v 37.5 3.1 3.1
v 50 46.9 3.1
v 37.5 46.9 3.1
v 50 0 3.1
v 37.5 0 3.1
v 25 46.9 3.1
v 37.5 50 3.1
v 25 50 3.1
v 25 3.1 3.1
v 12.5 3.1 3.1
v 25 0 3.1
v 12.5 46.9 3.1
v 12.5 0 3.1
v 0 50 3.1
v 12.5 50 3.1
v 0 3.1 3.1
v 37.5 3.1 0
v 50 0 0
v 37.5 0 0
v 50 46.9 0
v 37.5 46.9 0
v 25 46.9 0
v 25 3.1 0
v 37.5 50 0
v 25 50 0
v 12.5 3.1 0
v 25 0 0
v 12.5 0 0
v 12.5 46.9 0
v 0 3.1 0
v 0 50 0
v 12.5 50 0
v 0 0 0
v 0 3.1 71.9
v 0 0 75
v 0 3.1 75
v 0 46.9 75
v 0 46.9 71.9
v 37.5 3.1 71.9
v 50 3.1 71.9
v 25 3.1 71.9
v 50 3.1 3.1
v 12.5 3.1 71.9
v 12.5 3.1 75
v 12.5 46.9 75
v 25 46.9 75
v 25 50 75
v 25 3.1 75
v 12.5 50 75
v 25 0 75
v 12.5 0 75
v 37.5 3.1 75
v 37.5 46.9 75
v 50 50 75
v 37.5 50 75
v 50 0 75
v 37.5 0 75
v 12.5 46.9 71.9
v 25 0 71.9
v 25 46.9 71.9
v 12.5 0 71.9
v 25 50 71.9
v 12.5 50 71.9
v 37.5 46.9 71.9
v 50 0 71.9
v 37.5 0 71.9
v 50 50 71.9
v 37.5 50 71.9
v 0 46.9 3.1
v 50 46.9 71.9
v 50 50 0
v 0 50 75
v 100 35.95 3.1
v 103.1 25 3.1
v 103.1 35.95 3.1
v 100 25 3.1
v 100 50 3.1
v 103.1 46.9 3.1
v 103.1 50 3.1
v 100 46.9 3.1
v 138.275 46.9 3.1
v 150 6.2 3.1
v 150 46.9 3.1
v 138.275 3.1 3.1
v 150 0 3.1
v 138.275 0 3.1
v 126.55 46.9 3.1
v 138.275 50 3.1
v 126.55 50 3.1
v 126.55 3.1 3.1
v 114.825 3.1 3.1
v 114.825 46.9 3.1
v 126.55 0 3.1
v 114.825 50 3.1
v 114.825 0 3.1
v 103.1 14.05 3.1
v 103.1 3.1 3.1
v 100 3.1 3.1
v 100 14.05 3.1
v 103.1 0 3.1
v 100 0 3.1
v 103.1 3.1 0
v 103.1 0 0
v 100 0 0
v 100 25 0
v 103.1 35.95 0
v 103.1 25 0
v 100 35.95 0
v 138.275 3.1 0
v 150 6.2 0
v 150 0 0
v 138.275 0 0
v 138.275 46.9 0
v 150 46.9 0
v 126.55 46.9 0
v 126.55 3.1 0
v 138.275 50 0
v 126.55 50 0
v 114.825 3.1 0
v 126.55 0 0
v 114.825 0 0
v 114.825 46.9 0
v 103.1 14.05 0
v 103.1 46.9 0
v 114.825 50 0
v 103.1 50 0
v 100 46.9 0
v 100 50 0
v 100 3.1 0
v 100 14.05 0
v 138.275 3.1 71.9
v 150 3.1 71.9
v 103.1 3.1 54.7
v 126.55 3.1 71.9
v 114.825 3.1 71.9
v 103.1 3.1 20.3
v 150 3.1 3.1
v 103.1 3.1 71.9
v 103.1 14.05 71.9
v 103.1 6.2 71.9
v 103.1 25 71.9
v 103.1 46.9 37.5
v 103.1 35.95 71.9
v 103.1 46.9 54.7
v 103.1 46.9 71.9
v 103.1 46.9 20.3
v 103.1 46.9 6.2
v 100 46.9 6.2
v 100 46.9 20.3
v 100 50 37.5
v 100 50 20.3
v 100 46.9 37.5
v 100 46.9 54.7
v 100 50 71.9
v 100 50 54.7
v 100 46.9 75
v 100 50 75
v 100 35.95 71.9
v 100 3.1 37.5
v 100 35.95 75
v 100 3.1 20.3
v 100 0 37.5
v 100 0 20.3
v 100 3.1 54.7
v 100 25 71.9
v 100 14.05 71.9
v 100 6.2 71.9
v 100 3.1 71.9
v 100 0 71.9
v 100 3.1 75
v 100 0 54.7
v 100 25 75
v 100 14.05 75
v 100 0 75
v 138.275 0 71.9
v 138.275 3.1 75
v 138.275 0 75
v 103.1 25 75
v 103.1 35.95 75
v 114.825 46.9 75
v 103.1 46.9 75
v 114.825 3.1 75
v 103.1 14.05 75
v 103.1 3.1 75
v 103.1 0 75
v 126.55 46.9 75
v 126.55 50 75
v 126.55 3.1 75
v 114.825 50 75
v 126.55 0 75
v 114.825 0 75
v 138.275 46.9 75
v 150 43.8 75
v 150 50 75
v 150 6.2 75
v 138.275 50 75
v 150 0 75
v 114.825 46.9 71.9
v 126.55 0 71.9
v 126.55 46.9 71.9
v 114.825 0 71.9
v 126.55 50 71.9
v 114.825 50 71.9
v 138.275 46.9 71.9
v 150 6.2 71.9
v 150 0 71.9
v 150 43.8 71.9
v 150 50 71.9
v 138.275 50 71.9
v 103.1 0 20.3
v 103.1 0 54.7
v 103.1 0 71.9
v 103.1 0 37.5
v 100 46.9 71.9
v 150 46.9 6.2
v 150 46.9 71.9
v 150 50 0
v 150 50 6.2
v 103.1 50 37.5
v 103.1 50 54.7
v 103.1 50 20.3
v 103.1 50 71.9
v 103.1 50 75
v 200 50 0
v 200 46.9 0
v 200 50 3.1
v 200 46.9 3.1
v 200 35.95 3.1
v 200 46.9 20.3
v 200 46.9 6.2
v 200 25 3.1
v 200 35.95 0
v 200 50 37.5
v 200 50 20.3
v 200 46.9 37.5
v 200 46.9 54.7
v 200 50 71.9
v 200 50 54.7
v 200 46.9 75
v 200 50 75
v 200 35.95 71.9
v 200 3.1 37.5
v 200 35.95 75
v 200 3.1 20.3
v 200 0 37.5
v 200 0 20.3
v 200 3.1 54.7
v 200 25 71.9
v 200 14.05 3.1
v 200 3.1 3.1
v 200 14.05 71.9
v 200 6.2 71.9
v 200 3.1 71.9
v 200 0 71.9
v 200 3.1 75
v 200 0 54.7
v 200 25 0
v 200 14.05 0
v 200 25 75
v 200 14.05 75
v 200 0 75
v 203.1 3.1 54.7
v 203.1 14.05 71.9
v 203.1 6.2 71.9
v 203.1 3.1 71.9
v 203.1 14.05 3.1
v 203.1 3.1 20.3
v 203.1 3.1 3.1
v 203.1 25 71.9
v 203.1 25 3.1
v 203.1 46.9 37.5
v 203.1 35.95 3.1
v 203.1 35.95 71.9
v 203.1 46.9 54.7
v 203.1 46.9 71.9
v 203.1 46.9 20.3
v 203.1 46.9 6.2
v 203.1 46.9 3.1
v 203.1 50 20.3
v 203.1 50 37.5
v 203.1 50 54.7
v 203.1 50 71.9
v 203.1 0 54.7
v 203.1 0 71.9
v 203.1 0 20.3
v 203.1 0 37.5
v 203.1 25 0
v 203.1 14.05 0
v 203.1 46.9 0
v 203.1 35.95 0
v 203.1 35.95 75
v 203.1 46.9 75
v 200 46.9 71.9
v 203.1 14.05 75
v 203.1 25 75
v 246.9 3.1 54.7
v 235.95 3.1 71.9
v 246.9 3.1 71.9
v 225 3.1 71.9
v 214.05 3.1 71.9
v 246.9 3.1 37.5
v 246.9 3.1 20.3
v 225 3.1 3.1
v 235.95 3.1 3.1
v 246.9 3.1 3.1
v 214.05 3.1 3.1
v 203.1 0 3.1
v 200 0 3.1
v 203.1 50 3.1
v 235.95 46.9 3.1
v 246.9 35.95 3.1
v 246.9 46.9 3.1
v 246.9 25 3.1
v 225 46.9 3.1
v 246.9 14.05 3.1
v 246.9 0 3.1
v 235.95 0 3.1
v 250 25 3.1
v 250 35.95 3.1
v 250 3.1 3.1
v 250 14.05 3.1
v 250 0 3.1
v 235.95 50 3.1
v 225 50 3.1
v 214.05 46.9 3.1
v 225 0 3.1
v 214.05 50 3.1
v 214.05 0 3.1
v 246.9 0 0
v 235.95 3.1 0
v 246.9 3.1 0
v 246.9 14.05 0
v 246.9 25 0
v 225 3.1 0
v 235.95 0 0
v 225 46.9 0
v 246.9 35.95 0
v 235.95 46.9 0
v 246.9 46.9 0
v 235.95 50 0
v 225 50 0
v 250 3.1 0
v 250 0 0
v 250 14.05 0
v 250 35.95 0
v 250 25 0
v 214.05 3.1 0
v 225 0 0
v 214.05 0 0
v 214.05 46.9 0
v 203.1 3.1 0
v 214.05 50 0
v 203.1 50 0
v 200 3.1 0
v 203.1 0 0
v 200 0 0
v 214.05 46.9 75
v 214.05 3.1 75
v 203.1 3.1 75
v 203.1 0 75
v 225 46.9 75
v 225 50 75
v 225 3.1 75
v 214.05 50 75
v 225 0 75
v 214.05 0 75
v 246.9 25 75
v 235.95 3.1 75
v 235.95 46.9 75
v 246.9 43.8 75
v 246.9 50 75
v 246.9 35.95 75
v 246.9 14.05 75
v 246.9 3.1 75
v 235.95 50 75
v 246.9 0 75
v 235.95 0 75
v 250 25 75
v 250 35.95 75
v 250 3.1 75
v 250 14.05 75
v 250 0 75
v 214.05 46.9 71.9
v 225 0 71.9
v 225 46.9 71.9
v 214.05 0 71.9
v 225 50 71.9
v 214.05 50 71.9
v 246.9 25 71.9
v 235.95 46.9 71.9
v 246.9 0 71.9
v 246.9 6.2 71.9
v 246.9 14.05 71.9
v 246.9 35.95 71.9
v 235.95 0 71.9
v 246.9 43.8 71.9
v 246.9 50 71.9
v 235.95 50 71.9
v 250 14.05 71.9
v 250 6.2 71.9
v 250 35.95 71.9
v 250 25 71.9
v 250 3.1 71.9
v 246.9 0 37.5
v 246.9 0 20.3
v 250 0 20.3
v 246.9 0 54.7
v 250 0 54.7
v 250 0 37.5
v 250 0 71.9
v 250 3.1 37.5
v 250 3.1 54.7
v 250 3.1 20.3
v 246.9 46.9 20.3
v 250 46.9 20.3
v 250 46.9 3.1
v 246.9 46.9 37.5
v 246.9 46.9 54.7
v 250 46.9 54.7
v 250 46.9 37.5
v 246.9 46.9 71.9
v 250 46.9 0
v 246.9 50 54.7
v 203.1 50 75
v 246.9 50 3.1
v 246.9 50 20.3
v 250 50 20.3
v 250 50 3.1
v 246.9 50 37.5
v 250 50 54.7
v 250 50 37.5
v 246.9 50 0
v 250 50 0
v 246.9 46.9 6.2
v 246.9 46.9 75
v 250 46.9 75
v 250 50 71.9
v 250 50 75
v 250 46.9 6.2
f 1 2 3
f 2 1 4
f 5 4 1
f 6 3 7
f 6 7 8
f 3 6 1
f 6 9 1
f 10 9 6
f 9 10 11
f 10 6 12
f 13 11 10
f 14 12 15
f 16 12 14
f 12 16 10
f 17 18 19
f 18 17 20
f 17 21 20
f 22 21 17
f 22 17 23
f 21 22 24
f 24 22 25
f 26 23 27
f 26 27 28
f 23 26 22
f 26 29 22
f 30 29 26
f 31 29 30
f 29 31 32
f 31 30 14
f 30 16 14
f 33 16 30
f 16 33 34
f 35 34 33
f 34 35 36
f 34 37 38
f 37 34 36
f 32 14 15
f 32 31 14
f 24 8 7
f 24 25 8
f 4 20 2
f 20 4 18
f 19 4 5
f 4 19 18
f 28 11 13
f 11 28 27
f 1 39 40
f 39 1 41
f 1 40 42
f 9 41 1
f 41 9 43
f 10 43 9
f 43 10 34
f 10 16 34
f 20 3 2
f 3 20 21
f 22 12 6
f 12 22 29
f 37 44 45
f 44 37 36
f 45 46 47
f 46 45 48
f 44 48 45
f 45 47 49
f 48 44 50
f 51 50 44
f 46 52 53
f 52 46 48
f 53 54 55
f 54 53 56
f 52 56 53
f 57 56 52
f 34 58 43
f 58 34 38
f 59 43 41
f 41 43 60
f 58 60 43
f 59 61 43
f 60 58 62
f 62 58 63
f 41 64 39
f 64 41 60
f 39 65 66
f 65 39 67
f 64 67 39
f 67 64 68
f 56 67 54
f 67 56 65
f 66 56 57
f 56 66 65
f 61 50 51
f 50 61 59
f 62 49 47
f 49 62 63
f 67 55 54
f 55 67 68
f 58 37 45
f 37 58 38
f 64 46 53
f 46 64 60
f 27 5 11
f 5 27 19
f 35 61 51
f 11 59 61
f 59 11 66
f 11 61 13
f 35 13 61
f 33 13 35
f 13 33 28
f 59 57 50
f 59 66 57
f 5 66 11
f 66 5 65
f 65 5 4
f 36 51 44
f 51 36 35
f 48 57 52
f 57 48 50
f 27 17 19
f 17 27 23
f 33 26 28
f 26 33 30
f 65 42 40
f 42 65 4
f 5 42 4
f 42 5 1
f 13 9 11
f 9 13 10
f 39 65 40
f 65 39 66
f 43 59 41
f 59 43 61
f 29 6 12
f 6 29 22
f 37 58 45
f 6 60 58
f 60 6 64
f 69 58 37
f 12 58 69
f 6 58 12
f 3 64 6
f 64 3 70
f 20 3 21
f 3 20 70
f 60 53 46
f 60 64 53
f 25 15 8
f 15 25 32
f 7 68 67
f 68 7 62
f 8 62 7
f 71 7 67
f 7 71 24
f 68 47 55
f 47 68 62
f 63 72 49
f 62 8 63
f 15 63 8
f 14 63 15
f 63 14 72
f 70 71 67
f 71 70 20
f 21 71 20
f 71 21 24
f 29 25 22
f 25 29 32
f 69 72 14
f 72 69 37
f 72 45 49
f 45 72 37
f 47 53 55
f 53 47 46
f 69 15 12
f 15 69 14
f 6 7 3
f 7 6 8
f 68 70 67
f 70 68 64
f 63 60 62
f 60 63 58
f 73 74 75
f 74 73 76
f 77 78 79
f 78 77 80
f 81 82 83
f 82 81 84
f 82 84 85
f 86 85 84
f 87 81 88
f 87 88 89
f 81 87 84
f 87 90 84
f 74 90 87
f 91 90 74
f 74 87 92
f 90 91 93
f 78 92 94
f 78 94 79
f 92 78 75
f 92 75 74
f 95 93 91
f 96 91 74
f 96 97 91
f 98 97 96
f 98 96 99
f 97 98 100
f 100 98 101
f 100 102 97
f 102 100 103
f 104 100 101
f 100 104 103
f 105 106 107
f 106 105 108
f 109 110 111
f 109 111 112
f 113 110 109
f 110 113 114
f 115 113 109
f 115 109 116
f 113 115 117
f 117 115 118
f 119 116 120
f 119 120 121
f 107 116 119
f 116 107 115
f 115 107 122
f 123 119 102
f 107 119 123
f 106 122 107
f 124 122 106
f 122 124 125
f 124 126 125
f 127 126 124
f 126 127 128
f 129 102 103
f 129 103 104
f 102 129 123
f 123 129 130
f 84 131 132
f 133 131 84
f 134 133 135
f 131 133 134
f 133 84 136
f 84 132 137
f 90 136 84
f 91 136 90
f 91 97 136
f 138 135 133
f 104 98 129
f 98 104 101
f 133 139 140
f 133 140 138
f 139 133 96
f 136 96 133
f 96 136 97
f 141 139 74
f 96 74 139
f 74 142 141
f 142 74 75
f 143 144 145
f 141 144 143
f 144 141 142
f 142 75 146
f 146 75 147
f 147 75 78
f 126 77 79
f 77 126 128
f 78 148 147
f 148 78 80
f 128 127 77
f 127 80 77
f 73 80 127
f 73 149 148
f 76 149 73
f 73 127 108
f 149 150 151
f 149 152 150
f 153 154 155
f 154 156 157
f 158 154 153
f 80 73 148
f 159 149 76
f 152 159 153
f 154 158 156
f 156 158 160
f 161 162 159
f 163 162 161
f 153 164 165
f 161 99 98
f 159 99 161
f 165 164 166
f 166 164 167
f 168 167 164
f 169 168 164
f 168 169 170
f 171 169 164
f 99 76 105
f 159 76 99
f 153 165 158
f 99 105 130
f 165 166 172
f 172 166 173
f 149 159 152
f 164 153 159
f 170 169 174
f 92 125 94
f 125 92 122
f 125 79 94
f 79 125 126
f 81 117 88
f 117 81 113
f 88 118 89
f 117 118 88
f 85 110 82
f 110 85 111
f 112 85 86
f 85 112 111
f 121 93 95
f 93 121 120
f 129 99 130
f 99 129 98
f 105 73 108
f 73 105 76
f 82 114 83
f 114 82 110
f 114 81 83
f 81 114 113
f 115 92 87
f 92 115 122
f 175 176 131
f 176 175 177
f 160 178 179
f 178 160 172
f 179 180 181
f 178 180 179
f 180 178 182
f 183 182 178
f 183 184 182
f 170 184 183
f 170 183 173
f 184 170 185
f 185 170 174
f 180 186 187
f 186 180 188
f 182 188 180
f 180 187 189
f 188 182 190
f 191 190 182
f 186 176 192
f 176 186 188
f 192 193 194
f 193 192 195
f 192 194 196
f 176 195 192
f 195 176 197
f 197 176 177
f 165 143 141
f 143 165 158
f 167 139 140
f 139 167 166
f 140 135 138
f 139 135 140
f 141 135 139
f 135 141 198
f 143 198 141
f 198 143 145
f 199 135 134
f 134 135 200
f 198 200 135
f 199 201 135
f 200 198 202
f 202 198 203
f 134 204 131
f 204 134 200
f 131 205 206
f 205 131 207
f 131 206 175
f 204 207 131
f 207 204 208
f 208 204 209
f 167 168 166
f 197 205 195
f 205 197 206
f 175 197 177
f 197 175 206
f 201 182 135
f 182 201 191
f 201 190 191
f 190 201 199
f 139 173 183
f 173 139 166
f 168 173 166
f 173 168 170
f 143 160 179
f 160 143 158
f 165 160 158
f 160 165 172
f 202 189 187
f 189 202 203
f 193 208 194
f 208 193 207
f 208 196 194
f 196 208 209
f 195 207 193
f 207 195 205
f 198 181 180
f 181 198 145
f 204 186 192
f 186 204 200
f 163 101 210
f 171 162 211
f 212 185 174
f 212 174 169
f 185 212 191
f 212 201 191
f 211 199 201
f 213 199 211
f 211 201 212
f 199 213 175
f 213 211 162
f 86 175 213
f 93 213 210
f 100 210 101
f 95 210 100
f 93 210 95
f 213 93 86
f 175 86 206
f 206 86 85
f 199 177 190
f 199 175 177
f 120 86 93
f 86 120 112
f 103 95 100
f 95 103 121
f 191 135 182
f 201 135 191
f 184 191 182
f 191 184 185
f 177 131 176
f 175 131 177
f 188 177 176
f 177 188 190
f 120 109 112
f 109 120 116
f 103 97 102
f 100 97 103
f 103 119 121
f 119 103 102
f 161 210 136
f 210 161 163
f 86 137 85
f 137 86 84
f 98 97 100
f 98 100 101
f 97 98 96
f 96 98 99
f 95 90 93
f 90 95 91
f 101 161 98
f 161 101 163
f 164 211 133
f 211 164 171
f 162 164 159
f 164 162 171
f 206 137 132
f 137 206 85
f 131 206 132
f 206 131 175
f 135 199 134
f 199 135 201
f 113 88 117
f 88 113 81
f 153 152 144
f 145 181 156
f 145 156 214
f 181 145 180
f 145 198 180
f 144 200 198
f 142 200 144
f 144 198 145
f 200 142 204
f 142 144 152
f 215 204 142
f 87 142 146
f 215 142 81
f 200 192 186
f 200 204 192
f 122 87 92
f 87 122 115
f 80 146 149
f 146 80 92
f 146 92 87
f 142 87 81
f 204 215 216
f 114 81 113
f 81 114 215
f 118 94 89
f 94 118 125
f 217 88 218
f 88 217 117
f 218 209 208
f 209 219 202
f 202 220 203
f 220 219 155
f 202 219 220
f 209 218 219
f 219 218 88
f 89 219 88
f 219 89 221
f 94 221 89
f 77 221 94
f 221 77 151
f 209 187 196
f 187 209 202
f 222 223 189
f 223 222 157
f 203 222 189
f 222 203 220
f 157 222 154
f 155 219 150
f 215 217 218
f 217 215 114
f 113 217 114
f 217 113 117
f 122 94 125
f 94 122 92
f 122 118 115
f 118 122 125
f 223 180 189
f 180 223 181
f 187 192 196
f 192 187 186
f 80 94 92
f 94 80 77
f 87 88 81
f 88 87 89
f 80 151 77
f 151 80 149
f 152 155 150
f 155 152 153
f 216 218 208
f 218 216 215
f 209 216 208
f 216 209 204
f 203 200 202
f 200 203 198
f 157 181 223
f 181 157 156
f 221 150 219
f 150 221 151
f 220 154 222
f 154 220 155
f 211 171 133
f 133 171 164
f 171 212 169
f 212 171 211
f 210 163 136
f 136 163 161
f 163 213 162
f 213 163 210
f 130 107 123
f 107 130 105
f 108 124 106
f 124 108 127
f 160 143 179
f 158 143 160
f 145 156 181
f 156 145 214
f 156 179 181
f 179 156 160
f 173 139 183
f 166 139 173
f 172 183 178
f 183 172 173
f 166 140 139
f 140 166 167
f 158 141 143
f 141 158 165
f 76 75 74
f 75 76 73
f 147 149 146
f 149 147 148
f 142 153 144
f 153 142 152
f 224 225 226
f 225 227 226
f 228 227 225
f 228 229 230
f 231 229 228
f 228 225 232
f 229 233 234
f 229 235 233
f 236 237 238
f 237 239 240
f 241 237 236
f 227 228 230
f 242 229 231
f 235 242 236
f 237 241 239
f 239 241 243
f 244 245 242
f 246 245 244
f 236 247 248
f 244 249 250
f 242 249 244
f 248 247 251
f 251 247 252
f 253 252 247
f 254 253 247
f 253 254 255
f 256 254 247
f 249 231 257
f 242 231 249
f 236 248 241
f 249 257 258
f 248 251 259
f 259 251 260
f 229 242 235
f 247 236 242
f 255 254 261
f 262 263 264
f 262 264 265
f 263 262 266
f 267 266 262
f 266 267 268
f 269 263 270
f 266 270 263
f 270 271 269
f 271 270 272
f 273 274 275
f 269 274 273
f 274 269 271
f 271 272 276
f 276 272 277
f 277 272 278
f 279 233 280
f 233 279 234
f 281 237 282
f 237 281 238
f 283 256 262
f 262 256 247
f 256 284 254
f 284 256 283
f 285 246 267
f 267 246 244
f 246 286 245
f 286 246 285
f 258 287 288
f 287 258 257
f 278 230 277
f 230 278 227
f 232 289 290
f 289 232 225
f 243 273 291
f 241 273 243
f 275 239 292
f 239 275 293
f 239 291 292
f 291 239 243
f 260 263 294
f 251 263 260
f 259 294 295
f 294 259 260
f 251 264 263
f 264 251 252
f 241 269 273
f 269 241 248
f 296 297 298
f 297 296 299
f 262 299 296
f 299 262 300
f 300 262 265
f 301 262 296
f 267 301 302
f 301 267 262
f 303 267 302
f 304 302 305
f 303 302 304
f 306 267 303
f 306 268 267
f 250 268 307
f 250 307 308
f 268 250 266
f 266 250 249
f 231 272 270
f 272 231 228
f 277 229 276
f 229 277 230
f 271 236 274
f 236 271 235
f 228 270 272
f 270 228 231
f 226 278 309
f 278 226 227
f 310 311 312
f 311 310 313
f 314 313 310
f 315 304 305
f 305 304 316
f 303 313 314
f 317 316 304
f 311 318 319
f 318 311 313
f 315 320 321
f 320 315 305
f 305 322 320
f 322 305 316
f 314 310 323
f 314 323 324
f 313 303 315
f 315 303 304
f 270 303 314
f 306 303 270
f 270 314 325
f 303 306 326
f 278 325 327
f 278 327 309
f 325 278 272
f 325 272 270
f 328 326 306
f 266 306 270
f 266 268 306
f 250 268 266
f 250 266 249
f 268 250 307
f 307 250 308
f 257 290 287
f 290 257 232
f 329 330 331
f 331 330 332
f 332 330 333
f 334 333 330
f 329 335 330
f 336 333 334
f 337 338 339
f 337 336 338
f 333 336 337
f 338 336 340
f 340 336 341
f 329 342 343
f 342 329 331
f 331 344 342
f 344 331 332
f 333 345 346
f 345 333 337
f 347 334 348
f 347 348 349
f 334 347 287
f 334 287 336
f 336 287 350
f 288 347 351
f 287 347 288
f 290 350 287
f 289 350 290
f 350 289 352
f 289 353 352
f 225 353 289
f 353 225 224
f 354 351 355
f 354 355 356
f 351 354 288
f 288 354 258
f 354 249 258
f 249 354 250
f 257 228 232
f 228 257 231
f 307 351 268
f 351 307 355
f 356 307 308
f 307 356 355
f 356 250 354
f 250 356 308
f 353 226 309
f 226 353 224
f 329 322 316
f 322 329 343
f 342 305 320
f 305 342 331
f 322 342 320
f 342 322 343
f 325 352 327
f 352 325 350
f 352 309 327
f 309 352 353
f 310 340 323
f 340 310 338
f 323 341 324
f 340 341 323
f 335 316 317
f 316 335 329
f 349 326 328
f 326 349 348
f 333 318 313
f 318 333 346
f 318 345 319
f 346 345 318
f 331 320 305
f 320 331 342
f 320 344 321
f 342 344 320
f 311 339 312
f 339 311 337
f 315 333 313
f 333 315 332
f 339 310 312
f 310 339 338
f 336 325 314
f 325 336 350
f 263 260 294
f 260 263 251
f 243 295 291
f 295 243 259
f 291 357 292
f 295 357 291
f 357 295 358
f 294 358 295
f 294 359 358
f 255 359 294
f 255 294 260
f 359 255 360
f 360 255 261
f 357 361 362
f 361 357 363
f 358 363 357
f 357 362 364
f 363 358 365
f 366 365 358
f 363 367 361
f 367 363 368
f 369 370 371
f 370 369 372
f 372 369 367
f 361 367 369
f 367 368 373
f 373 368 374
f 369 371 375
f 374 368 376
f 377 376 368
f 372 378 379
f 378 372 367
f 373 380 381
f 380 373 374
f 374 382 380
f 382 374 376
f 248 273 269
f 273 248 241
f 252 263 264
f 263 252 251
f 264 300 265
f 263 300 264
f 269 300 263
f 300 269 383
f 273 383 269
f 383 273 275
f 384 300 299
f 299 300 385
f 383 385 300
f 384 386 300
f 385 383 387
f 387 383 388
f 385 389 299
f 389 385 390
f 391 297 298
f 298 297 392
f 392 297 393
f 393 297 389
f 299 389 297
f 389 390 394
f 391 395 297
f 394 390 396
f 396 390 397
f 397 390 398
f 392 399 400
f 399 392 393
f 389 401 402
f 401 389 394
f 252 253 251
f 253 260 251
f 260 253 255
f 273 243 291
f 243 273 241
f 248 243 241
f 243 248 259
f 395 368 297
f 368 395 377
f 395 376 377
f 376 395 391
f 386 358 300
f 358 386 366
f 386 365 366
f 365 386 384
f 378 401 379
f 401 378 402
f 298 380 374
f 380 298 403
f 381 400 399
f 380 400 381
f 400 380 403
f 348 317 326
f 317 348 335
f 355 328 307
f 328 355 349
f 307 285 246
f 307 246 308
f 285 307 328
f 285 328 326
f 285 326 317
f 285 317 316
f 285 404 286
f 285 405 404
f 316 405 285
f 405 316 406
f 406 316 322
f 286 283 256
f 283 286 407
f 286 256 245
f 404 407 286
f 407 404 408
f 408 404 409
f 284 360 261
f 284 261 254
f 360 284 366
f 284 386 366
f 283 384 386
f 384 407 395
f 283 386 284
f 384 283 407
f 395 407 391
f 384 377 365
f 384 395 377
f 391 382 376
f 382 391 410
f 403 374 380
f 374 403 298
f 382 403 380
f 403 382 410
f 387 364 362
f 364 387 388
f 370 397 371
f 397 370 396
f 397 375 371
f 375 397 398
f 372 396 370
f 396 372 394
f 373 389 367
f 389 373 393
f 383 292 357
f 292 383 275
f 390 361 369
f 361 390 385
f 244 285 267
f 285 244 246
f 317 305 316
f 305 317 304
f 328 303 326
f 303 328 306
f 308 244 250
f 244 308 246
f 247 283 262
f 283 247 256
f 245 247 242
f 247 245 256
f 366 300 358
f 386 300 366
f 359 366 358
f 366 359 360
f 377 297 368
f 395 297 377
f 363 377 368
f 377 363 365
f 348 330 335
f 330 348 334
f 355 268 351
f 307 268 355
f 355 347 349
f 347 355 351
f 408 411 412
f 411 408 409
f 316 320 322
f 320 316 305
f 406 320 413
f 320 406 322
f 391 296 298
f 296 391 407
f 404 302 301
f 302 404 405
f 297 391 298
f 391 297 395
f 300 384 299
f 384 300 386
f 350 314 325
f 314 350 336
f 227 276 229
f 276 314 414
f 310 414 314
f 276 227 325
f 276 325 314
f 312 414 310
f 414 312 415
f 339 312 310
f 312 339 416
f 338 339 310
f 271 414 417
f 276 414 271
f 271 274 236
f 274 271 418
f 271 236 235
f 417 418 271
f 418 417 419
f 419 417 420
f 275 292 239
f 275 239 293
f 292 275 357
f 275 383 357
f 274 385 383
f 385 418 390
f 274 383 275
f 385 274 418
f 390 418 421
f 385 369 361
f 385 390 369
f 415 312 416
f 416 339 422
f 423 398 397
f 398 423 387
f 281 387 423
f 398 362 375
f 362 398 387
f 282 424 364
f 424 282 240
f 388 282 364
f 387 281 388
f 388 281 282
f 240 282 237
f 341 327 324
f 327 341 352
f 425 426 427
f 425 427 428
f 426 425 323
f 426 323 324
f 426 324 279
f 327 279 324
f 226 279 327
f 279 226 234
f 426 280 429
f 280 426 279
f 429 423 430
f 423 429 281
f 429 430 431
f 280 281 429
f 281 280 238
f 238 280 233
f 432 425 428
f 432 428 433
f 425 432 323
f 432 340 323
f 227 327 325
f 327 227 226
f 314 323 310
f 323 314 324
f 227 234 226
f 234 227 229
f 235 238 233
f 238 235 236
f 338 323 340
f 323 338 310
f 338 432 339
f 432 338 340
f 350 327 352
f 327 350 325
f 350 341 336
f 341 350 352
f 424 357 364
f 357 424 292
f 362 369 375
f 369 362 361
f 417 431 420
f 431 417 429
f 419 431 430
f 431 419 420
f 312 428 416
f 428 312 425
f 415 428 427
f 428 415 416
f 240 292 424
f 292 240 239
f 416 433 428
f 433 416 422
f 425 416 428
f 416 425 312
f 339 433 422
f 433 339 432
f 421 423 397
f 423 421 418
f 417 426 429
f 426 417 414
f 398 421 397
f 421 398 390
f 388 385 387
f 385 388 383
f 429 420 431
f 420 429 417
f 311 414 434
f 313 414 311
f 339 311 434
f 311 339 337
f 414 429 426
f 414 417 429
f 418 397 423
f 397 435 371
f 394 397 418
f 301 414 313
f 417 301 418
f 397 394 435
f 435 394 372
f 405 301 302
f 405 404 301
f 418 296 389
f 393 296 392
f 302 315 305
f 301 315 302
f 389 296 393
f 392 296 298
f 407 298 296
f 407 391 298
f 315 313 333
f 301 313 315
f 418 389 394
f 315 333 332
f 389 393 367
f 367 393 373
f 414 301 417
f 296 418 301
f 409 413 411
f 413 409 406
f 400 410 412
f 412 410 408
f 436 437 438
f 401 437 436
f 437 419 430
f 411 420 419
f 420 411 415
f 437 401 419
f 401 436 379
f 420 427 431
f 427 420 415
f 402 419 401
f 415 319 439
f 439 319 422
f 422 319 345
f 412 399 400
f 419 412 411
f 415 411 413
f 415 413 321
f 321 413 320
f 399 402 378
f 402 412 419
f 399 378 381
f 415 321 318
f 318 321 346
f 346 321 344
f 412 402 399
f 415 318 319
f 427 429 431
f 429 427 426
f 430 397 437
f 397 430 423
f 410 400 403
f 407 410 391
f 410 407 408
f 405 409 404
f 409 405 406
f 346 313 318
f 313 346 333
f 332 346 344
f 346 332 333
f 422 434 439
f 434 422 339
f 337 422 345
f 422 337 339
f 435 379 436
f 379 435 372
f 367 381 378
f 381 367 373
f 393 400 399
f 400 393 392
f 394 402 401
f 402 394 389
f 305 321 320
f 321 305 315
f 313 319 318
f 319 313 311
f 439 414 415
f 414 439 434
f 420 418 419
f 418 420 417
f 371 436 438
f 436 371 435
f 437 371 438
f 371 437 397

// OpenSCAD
include <../lasercut.scad>; 

thickness = 3.1;
x = 50;
y = 50;
z = 75; 


for (sides =[4:6])
{
    color("Gold",0.75) translate([100*(sides-4),0,0]) 
        lasercutoutBox(thickness = thickness, x=x, y=y, z=z, sides=sides);
}
